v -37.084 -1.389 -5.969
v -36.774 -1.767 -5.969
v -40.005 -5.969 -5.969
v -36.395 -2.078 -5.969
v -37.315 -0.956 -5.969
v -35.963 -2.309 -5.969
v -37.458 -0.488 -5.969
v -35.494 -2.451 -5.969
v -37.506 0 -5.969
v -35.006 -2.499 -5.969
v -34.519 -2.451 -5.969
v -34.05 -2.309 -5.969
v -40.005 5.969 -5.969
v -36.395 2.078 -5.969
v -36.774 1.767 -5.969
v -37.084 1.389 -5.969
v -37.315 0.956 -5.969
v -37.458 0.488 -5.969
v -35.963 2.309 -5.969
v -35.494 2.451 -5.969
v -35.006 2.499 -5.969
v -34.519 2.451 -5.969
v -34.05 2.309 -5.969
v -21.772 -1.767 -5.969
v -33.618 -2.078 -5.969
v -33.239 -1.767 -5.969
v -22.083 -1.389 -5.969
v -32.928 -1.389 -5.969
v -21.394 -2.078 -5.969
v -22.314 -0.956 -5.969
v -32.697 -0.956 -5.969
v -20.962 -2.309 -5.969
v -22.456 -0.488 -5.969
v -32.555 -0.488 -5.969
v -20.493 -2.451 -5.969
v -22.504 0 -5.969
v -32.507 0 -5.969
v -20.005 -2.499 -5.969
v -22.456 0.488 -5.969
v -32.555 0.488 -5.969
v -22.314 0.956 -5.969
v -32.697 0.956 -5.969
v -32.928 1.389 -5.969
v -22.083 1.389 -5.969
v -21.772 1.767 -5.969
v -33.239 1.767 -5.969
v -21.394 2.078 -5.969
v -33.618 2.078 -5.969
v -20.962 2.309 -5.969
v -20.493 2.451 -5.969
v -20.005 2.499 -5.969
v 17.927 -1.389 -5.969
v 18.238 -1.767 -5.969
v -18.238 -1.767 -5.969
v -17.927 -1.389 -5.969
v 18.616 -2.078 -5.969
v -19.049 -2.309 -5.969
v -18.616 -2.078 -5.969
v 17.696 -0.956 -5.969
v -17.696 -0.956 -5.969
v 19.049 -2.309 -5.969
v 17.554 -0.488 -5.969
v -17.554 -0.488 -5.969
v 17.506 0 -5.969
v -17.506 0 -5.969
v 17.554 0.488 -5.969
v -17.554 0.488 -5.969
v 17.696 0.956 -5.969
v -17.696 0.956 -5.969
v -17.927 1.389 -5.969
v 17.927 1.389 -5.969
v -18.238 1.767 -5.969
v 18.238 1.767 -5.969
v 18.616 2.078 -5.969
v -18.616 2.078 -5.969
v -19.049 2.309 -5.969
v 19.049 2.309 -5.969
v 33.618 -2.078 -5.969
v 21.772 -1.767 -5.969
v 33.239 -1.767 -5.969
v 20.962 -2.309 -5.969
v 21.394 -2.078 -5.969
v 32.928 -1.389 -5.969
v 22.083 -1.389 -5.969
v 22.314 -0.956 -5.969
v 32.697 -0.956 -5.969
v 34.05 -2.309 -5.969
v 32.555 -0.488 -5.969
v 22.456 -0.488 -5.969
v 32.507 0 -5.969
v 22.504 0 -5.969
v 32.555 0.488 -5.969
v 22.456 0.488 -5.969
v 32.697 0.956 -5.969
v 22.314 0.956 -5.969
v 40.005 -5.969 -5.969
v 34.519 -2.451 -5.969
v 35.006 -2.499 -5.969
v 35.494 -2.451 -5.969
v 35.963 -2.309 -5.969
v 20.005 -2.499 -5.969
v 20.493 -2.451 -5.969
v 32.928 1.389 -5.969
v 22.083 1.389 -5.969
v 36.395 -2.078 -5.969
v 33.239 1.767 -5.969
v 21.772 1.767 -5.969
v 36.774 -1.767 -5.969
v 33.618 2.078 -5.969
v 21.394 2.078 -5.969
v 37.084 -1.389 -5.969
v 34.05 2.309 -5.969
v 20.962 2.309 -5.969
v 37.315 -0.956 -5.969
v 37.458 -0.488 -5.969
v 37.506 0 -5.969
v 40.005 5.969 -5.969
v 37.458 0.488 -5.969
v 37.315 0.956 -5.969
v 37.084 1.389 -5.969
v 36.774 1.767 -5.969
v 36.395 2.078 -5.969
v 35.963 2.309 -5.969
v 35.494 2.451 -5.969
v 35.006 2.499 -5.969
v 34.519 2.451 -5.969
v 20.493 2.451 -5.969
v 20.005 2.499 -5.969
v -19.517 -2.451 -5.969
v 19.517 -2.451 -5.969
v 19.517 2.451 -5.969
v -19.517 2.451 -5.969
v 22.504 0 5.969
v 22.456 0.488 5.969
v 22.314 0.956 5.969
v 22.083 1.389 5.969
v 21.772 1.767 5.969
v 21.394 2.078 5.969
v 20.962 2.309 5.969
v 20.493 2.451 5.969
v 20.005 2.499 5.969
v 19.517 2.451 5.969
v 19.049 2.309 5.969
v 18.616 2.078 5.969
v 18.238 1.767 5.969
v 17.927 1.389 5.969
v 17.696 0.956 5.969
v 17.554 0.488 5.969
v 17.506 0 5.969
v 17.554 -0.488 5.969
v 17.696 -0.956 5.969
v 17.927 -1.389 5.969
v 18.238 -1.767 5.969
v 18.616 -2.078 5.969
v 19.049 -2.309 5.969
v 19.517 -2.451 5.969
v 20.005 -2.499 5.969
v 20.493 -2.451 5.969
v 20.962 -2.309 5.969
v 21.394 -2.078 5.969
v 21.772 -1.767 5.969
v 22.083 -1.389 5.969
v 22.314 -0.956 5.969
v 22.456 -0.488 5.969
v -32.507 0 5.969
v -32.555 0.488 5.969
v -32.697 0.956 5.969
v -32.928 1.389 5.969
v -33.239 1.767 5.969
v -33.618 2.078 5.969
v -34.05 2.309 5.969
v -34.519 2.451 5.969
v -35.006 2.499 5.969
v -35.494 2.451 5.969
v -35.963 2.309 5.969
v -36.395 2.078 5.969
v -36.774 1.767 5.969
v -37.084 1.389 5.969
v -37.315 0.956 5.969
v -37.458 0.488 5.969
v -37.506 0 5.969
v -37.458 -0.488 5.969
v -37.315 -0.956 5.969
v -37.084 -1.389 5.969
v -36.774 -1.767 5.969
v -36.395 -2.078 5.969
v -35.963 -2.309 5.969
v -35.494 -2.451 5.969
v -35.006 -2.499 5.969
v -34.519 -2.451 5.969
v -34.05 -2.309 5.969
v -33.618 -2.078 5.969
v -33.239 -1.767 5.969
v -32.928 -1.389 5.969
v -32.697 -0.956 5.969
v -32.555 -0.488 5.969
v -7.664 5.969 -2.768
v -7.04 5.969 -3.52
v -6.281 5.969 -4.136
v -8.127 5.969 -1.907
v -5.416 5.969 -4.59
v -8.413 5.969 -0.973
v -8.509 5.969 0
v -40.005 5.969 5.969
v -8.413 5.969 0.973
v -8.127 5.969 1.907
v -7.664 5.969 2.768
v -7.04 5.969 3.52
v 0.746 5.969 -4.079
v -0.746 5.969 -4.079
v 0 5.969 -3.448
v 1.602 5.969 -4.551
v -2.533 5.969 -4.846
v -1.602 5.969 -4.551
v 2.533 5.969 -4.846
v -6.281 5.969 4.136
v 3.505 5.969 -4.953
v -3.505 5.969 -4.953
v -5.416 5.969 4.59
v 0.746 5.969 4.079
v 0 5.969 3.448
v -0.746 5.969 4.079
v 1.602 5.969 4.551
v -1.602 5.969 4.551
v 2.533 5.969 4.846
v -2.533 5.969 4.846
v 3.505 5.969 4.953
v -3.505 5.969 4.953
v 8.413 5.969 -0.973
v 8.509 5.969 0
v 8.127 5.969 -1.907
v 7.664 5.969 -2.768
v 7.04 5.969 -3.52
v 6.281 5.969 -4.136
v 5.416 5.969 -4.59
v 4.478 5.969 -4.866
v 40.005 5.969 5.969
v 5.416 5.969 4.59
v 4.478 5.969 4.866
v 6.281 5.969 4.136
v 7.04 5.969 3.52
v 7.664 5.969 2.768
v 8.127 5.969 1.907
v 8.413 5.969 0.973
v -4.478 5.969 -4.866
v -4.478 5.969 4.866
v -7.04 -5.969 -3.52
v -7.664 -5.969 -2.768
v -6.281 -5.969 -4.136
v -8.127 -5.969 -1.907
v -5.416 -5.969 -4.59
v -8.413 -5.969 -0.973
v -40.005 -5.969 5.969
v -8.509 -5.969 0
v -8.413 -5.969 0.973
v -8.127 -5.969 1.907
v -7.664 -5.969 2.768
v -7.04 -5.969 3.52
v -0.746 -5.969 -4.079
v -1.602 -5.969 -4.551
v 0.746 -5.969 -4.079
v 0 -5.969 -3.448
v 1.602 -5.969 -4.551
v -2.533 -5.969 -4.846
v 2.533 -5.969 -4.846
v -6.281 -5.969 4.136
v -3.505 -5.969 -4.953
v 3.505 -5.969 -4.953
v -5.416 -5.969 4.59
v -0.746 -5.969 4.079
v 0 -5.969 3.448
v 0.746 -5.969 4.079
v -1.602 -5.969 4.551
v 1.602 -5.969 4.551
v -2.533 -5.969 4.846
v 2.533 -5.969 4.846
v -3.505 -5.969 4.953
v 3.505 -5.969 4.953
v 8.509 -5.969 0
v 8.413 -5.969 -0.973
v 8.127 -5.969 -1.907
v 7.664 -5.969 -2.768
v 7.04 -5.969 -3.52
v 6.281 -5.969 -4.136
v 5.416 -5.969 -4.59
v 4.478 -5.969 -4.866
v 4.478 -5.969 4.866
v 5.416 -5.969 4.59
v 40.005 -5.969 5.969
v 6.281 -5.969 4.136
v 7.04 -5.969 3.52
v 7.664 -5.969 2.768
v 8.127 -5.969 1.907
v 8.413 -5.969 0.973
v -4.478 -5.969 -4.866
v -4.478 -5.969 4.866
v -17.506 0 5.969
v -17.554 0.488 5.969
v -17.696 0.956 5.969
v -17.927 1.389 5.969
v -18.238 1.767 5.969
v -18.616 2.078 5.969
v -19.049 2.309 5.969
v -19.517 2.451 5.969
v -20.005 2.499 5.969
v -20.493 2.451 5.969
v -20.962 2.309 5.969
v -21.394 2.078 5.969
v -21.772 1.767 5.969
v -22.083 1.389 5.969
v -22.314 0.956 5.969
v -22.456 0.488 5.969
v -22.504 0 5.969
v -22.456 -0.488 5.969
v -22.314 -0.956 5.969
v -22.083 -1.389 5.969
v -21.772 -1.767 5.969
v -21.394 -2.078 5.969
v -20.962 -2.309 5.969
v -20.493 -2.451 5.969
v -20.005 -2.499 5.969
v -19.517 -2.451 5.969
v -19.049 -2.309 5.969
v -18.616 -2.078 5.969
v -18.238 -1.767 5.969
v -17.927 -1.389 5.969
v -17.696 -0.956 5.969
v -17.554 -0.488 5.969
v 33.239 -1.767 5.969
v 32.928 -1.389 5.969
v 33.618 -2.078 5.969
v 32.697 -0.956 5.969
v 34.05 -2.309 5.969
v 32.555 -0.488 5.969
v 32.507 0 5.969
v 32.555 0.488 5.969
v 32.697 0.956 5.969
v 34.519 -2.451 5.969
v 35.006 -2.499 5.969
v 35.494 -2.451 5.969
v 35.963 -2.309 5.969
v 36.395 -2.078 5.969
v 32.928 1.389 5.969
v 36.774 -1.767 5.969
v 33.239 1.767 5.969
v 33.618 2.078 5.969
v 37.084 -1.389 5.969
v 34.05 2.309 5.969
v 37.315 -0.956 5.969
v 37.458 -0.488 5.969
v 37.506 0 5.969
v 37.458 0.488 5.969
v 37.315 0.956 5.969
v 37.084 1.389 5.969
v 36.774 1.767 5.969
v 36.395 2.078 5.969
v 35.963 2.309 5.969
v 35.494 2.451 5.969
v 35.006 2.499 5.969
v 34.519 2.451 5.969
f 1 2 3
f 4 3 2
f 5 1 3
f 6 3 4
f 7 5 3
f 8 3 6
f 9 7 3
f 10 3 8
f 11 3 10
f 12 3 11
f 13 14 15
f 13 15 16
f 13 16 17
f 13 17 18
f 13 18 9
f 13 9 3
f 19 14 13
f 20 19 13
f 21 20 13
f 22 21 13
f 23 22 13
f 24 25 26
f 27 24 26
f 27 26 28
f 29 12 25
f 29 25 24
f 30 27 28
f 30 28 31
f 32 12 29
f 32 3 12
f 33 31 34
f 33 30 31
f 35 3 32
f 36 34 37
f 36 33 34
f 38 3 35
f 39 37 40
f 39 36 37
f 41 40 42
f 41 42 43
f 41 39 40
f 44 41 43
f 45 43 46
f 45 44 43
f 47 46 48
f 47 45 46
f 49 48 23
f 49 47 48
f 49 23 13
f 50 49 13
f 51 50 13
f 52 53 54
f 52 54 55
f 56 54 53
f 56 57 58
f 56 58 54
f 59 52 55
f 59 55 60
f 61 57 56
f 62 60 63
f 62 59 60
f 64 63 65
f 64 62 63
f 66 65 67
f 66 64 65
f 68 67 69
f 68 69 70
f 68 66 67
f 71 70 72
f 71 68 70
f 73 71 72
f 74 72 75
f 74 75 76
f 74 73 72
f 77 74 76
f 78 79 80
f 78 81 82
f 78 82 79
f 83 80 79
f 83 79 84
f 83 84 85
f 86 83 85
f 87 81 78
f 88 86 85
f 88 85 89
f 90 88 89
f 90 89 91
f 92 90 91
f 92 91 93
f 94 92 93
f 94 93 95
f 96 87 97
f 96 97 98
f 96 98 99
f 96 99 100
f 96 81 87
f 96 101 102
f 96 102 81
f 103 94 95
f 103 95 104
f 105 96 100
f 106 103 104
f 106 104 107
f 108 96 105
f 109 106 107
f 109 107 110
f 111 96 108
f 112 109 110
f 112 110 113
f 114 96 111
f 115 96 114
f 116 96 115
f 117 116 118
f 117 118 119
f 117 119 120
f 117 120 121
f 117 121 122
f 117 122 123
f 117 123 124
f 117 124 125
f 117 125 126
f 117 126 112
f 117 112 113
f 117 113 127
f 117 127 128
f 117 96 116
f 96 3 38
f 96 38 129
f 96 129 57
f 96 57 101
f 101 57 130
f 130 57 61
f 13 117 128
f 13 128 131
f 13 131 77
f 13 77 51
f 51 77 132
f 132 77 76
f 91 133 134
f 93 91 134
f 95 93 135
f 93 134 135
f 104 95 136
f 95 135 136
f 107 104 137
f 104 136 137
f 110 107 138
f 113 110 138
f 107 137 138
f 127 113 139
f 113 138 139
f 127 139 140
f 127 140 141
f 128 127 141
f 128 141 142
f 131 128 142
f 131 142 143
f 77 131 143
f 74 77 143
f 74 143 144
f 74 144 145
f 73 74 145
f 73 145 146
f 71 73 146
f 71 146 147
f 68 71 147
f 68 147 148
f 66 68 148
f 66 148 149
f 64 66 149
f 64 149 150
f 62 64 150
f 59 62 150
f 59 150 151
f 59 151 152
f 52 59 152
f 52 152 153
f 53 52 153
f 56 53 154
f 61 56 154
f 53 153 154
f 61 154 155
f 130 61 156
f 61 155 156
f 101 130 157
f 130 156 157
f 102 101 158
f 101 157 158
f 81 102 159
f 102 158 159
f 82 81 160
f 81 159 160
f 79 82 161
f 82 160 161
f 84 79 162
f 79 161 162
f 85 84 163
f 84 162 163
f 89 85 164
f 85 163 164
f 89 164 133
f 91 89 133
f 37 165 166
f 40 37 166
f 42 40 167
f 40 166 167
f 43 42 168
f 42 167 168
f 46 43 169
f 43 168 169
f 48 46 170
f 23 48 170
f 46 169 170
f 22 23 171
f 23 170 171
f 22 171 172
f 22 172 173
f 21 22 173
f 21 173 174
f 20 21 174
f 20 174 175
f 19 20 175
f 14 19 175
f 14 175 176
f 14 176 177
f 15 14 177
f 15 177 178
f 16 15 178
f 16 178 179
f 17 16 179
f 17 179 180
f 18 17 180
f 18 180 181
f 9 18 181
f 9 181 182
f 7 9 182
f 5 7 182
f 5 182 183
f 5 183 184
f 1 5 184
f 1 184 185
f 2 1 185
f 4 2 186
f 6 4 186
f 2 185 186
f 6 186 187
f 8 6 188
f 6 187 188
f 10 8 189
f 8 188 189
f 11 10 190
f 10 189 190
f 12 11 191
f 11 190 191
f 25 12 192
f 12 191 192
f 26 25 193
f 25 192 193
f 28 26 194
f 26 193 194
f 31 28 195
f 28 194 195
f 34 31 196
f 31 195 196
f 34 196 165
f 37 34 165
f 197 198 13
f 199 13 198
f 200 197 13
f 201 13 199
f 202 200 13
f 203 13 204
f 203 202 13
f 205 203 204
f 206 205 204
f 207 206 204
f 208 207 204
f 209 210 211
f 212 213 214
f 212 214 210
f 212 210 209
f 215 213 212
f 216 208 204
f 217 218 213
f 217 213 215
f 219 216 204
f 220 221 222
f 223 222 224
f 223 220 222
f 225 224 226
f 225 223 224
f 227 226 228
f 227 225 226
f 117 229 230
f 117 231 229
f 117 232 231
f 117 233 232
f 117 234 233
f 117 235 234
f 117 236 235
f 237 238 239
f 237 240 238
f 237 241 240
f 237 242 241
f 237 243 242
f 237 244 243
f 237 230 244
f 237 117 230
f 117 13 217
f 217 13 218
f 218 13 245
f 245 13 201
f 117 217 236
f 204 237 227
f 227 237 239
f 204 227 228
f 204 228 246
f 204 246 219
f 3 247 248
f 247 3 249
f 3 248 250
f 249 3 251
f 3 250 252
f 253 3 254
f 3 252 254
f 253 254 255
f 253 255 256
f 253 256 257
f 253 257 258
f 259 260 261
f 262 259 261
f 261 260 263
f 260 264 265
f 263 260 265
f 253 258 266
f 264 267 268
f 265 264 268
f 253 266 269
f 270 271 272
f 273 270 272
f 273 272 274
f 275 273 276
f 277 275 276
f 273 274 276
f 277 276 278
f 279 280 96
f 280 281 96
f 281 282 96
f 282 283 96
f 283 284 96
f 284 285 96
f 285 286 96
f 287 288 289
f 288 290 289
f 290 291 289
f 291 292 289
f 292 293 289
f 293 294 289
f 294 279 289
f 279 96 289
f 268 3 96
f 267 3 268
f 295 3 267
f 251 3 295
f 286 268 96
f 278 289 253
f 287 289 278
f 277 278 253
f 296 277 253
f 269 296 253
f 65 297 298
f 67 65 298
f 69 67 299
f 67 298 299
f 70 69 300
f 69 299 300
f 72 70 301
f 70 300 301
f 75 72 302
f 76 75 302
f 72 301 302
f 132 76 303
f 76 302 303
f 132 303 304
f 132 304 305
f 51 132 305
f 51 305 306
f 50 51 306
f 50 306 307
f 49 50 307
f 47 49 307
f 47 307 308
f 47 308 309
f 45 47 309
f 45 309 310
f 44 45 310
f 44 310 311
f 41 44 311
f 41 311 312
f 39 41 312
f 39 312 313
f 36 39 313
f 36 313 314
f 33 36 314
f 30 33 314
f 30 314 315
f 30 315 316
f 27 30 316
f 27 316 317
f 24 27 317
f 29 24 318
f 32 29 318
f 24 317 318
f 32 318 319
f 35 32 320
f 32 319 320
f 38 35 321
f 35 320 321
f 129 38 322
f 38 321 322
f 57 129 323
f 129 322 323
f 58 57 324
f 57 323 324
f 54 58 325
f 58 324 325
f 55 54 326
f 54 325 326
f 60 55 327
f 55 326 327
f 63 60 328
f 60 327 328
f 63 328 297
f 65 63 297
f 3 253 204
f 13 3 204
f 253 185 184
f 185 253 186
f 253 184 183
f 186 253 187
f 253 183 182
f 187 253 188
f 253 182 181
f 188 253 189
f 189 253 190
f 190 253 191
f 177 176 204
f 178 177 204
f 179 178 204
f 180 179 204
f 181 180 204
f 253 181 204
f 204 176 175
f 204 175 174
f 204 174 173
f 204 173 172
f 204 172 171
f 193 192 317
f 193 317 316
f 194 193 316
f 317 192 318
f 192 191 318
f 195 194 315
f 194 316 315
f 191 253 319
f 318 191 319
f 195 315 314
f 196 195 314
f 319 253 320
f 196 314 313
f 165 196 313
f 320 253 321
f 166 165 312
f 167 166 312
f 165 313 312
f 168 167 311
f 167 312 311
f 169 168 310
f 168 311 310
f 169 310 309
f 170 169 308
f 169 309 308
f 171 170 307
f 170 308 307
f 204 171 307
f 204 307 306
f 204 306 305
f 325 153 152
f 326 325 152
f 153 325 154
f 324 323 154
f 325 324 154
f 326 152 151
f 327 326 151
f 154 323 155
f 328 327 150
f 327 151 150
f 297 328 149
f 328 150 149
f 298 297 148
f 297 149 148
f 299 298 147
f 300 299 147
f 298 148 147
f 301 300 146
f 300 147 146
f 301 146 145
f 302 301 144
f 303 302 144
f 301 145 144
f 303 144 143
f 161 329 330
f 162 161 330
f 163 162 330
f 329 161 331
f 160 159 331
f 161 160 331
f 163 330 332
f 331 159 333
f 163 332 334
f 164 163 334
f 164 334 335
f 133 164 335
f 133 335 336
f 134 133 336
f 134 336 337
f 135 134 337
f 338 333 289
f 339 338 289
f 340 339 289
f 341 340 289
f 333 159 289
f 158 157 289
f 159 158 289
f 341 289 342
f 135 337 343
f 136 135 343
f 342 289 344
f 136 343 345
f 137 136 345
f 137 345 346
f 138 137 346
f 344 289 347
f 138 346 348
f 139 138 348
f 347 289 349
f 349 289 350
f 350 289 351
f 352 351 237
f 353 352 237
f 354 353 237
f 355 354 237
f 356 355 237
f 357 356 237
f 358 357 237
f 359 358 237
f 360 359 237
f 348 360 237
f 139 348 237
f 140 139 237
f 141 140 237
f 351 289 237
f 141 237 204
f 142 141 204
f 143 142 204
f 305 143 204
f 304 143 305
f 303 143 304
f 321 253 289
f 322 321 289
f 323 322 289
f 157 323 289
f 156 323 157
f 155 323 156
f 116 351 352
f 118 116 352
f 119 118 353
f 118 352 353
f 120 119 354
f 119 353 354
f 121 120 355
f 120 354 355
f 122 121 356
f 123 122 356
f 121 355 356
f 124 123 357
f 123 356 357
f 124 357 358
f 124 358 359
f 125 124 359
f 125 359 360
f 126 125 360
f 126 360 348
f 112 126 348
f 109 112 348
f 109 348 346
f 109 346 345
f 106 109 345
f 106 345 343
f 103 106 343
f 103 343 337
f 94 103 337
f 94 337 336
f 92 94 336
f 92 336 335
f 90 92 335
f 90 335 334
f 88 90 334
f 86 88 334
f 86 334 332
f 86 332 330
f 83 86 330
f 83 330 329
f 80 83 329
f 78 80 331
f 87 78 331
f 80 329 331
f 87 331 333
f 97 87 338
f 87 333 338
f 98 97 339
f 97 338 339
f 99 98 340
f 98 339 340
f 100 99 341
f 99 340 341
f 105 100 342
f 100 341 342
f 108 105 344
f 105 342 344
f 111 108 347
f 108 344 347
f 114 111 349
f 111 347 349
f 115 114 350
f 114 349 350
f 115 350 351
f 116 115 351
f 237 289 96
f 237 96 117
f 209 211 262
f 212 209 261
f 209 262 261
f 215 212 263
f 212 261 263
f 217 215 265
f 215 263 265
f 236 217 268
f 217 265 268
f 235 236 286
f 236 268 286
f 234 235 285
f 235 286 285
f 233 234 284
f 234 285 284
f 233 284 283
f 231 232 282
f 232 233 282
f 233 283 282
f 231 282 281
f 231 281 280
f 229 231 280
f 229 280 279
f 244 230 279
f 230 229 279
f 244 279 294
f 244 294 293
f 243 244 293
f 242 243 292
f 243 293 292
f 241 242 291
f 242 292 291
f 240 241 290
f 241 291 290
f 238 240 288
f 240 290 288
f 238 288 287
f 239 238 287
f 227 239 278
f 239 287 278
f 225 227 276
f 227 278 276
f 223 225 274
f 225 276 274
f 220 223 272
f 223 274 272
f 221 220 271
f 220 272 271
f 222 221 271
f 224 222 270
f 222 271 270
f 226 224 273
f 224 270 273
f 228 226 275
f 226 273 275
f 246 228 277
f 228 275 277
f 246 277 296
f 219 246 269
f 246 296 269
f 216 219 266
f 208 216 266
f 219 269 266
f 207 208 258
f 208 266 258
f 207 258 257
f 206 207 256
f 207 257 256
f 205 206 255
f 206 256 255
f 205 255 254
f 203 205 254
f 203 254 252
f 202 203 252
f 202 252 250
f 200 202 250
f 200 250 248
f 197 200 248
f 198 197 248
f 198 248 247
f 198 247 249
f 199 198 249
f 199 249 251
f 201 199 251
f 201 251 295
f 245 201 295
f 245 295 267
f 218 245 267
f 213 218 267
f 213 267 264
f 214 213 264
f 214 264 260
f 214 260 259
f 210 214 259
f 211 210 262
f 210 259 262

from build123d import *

# Parameters (mm, degrees)
F0_W     = 11.938
F0_H     = 11.938
F1_DEPTH = 40.005
F2_R     = 4.953
F3_DEPTH = 25.4
F4_R     = 4.953
F5_DEPTH = 11.939
F6_R     = 2.49936
F7_DEPTH = 11.939


with BuildPart() as f1:
    # F0 (on Right) → F1 (new body, symmetric)
    with BuildSketch(Plane.YZ):
        Rectangle(F0_W, F0_H)
    extrude(amount=F1_DEPTH, both=True)

    # F2 (on face) → F3 (cut)
    with BuildSketch(Plane.XZ.offset(5.969)):
        with Locations((3.556, 0)):
            Circle(F2_R)
    extrude(amount=-F3_DEPTH, mode=Mode.SUBTRACT)

    # F4 (on face) → F5 (cut, through all)
    with BuildSketch(Plane.XZ.offset(5.969)):
        with Locations((-3.556, 0)):
            Circle(F4_R)
    extrude(amount=-F5_DEPTH, mode=Mode.SUBTRACT)

    # F6 (on face) → F7 (cut, through all)
    with BuildSketch(Plane.XY.offset(5.969)):
        with Locations((-35.00628, 0)):
            Circle(F6_R)
        with Locations((-20.00504, 0)):
            Circle(F6_R)
        with Locations((20.00504, 0)):
            Circle(F6_R)
        with Locations((35.00628, 0)):
            Circle(F6_R)
    extrude(amount=-F7_DEPTH, mode=Mode.SUBTRACT)


solid = f1.part
